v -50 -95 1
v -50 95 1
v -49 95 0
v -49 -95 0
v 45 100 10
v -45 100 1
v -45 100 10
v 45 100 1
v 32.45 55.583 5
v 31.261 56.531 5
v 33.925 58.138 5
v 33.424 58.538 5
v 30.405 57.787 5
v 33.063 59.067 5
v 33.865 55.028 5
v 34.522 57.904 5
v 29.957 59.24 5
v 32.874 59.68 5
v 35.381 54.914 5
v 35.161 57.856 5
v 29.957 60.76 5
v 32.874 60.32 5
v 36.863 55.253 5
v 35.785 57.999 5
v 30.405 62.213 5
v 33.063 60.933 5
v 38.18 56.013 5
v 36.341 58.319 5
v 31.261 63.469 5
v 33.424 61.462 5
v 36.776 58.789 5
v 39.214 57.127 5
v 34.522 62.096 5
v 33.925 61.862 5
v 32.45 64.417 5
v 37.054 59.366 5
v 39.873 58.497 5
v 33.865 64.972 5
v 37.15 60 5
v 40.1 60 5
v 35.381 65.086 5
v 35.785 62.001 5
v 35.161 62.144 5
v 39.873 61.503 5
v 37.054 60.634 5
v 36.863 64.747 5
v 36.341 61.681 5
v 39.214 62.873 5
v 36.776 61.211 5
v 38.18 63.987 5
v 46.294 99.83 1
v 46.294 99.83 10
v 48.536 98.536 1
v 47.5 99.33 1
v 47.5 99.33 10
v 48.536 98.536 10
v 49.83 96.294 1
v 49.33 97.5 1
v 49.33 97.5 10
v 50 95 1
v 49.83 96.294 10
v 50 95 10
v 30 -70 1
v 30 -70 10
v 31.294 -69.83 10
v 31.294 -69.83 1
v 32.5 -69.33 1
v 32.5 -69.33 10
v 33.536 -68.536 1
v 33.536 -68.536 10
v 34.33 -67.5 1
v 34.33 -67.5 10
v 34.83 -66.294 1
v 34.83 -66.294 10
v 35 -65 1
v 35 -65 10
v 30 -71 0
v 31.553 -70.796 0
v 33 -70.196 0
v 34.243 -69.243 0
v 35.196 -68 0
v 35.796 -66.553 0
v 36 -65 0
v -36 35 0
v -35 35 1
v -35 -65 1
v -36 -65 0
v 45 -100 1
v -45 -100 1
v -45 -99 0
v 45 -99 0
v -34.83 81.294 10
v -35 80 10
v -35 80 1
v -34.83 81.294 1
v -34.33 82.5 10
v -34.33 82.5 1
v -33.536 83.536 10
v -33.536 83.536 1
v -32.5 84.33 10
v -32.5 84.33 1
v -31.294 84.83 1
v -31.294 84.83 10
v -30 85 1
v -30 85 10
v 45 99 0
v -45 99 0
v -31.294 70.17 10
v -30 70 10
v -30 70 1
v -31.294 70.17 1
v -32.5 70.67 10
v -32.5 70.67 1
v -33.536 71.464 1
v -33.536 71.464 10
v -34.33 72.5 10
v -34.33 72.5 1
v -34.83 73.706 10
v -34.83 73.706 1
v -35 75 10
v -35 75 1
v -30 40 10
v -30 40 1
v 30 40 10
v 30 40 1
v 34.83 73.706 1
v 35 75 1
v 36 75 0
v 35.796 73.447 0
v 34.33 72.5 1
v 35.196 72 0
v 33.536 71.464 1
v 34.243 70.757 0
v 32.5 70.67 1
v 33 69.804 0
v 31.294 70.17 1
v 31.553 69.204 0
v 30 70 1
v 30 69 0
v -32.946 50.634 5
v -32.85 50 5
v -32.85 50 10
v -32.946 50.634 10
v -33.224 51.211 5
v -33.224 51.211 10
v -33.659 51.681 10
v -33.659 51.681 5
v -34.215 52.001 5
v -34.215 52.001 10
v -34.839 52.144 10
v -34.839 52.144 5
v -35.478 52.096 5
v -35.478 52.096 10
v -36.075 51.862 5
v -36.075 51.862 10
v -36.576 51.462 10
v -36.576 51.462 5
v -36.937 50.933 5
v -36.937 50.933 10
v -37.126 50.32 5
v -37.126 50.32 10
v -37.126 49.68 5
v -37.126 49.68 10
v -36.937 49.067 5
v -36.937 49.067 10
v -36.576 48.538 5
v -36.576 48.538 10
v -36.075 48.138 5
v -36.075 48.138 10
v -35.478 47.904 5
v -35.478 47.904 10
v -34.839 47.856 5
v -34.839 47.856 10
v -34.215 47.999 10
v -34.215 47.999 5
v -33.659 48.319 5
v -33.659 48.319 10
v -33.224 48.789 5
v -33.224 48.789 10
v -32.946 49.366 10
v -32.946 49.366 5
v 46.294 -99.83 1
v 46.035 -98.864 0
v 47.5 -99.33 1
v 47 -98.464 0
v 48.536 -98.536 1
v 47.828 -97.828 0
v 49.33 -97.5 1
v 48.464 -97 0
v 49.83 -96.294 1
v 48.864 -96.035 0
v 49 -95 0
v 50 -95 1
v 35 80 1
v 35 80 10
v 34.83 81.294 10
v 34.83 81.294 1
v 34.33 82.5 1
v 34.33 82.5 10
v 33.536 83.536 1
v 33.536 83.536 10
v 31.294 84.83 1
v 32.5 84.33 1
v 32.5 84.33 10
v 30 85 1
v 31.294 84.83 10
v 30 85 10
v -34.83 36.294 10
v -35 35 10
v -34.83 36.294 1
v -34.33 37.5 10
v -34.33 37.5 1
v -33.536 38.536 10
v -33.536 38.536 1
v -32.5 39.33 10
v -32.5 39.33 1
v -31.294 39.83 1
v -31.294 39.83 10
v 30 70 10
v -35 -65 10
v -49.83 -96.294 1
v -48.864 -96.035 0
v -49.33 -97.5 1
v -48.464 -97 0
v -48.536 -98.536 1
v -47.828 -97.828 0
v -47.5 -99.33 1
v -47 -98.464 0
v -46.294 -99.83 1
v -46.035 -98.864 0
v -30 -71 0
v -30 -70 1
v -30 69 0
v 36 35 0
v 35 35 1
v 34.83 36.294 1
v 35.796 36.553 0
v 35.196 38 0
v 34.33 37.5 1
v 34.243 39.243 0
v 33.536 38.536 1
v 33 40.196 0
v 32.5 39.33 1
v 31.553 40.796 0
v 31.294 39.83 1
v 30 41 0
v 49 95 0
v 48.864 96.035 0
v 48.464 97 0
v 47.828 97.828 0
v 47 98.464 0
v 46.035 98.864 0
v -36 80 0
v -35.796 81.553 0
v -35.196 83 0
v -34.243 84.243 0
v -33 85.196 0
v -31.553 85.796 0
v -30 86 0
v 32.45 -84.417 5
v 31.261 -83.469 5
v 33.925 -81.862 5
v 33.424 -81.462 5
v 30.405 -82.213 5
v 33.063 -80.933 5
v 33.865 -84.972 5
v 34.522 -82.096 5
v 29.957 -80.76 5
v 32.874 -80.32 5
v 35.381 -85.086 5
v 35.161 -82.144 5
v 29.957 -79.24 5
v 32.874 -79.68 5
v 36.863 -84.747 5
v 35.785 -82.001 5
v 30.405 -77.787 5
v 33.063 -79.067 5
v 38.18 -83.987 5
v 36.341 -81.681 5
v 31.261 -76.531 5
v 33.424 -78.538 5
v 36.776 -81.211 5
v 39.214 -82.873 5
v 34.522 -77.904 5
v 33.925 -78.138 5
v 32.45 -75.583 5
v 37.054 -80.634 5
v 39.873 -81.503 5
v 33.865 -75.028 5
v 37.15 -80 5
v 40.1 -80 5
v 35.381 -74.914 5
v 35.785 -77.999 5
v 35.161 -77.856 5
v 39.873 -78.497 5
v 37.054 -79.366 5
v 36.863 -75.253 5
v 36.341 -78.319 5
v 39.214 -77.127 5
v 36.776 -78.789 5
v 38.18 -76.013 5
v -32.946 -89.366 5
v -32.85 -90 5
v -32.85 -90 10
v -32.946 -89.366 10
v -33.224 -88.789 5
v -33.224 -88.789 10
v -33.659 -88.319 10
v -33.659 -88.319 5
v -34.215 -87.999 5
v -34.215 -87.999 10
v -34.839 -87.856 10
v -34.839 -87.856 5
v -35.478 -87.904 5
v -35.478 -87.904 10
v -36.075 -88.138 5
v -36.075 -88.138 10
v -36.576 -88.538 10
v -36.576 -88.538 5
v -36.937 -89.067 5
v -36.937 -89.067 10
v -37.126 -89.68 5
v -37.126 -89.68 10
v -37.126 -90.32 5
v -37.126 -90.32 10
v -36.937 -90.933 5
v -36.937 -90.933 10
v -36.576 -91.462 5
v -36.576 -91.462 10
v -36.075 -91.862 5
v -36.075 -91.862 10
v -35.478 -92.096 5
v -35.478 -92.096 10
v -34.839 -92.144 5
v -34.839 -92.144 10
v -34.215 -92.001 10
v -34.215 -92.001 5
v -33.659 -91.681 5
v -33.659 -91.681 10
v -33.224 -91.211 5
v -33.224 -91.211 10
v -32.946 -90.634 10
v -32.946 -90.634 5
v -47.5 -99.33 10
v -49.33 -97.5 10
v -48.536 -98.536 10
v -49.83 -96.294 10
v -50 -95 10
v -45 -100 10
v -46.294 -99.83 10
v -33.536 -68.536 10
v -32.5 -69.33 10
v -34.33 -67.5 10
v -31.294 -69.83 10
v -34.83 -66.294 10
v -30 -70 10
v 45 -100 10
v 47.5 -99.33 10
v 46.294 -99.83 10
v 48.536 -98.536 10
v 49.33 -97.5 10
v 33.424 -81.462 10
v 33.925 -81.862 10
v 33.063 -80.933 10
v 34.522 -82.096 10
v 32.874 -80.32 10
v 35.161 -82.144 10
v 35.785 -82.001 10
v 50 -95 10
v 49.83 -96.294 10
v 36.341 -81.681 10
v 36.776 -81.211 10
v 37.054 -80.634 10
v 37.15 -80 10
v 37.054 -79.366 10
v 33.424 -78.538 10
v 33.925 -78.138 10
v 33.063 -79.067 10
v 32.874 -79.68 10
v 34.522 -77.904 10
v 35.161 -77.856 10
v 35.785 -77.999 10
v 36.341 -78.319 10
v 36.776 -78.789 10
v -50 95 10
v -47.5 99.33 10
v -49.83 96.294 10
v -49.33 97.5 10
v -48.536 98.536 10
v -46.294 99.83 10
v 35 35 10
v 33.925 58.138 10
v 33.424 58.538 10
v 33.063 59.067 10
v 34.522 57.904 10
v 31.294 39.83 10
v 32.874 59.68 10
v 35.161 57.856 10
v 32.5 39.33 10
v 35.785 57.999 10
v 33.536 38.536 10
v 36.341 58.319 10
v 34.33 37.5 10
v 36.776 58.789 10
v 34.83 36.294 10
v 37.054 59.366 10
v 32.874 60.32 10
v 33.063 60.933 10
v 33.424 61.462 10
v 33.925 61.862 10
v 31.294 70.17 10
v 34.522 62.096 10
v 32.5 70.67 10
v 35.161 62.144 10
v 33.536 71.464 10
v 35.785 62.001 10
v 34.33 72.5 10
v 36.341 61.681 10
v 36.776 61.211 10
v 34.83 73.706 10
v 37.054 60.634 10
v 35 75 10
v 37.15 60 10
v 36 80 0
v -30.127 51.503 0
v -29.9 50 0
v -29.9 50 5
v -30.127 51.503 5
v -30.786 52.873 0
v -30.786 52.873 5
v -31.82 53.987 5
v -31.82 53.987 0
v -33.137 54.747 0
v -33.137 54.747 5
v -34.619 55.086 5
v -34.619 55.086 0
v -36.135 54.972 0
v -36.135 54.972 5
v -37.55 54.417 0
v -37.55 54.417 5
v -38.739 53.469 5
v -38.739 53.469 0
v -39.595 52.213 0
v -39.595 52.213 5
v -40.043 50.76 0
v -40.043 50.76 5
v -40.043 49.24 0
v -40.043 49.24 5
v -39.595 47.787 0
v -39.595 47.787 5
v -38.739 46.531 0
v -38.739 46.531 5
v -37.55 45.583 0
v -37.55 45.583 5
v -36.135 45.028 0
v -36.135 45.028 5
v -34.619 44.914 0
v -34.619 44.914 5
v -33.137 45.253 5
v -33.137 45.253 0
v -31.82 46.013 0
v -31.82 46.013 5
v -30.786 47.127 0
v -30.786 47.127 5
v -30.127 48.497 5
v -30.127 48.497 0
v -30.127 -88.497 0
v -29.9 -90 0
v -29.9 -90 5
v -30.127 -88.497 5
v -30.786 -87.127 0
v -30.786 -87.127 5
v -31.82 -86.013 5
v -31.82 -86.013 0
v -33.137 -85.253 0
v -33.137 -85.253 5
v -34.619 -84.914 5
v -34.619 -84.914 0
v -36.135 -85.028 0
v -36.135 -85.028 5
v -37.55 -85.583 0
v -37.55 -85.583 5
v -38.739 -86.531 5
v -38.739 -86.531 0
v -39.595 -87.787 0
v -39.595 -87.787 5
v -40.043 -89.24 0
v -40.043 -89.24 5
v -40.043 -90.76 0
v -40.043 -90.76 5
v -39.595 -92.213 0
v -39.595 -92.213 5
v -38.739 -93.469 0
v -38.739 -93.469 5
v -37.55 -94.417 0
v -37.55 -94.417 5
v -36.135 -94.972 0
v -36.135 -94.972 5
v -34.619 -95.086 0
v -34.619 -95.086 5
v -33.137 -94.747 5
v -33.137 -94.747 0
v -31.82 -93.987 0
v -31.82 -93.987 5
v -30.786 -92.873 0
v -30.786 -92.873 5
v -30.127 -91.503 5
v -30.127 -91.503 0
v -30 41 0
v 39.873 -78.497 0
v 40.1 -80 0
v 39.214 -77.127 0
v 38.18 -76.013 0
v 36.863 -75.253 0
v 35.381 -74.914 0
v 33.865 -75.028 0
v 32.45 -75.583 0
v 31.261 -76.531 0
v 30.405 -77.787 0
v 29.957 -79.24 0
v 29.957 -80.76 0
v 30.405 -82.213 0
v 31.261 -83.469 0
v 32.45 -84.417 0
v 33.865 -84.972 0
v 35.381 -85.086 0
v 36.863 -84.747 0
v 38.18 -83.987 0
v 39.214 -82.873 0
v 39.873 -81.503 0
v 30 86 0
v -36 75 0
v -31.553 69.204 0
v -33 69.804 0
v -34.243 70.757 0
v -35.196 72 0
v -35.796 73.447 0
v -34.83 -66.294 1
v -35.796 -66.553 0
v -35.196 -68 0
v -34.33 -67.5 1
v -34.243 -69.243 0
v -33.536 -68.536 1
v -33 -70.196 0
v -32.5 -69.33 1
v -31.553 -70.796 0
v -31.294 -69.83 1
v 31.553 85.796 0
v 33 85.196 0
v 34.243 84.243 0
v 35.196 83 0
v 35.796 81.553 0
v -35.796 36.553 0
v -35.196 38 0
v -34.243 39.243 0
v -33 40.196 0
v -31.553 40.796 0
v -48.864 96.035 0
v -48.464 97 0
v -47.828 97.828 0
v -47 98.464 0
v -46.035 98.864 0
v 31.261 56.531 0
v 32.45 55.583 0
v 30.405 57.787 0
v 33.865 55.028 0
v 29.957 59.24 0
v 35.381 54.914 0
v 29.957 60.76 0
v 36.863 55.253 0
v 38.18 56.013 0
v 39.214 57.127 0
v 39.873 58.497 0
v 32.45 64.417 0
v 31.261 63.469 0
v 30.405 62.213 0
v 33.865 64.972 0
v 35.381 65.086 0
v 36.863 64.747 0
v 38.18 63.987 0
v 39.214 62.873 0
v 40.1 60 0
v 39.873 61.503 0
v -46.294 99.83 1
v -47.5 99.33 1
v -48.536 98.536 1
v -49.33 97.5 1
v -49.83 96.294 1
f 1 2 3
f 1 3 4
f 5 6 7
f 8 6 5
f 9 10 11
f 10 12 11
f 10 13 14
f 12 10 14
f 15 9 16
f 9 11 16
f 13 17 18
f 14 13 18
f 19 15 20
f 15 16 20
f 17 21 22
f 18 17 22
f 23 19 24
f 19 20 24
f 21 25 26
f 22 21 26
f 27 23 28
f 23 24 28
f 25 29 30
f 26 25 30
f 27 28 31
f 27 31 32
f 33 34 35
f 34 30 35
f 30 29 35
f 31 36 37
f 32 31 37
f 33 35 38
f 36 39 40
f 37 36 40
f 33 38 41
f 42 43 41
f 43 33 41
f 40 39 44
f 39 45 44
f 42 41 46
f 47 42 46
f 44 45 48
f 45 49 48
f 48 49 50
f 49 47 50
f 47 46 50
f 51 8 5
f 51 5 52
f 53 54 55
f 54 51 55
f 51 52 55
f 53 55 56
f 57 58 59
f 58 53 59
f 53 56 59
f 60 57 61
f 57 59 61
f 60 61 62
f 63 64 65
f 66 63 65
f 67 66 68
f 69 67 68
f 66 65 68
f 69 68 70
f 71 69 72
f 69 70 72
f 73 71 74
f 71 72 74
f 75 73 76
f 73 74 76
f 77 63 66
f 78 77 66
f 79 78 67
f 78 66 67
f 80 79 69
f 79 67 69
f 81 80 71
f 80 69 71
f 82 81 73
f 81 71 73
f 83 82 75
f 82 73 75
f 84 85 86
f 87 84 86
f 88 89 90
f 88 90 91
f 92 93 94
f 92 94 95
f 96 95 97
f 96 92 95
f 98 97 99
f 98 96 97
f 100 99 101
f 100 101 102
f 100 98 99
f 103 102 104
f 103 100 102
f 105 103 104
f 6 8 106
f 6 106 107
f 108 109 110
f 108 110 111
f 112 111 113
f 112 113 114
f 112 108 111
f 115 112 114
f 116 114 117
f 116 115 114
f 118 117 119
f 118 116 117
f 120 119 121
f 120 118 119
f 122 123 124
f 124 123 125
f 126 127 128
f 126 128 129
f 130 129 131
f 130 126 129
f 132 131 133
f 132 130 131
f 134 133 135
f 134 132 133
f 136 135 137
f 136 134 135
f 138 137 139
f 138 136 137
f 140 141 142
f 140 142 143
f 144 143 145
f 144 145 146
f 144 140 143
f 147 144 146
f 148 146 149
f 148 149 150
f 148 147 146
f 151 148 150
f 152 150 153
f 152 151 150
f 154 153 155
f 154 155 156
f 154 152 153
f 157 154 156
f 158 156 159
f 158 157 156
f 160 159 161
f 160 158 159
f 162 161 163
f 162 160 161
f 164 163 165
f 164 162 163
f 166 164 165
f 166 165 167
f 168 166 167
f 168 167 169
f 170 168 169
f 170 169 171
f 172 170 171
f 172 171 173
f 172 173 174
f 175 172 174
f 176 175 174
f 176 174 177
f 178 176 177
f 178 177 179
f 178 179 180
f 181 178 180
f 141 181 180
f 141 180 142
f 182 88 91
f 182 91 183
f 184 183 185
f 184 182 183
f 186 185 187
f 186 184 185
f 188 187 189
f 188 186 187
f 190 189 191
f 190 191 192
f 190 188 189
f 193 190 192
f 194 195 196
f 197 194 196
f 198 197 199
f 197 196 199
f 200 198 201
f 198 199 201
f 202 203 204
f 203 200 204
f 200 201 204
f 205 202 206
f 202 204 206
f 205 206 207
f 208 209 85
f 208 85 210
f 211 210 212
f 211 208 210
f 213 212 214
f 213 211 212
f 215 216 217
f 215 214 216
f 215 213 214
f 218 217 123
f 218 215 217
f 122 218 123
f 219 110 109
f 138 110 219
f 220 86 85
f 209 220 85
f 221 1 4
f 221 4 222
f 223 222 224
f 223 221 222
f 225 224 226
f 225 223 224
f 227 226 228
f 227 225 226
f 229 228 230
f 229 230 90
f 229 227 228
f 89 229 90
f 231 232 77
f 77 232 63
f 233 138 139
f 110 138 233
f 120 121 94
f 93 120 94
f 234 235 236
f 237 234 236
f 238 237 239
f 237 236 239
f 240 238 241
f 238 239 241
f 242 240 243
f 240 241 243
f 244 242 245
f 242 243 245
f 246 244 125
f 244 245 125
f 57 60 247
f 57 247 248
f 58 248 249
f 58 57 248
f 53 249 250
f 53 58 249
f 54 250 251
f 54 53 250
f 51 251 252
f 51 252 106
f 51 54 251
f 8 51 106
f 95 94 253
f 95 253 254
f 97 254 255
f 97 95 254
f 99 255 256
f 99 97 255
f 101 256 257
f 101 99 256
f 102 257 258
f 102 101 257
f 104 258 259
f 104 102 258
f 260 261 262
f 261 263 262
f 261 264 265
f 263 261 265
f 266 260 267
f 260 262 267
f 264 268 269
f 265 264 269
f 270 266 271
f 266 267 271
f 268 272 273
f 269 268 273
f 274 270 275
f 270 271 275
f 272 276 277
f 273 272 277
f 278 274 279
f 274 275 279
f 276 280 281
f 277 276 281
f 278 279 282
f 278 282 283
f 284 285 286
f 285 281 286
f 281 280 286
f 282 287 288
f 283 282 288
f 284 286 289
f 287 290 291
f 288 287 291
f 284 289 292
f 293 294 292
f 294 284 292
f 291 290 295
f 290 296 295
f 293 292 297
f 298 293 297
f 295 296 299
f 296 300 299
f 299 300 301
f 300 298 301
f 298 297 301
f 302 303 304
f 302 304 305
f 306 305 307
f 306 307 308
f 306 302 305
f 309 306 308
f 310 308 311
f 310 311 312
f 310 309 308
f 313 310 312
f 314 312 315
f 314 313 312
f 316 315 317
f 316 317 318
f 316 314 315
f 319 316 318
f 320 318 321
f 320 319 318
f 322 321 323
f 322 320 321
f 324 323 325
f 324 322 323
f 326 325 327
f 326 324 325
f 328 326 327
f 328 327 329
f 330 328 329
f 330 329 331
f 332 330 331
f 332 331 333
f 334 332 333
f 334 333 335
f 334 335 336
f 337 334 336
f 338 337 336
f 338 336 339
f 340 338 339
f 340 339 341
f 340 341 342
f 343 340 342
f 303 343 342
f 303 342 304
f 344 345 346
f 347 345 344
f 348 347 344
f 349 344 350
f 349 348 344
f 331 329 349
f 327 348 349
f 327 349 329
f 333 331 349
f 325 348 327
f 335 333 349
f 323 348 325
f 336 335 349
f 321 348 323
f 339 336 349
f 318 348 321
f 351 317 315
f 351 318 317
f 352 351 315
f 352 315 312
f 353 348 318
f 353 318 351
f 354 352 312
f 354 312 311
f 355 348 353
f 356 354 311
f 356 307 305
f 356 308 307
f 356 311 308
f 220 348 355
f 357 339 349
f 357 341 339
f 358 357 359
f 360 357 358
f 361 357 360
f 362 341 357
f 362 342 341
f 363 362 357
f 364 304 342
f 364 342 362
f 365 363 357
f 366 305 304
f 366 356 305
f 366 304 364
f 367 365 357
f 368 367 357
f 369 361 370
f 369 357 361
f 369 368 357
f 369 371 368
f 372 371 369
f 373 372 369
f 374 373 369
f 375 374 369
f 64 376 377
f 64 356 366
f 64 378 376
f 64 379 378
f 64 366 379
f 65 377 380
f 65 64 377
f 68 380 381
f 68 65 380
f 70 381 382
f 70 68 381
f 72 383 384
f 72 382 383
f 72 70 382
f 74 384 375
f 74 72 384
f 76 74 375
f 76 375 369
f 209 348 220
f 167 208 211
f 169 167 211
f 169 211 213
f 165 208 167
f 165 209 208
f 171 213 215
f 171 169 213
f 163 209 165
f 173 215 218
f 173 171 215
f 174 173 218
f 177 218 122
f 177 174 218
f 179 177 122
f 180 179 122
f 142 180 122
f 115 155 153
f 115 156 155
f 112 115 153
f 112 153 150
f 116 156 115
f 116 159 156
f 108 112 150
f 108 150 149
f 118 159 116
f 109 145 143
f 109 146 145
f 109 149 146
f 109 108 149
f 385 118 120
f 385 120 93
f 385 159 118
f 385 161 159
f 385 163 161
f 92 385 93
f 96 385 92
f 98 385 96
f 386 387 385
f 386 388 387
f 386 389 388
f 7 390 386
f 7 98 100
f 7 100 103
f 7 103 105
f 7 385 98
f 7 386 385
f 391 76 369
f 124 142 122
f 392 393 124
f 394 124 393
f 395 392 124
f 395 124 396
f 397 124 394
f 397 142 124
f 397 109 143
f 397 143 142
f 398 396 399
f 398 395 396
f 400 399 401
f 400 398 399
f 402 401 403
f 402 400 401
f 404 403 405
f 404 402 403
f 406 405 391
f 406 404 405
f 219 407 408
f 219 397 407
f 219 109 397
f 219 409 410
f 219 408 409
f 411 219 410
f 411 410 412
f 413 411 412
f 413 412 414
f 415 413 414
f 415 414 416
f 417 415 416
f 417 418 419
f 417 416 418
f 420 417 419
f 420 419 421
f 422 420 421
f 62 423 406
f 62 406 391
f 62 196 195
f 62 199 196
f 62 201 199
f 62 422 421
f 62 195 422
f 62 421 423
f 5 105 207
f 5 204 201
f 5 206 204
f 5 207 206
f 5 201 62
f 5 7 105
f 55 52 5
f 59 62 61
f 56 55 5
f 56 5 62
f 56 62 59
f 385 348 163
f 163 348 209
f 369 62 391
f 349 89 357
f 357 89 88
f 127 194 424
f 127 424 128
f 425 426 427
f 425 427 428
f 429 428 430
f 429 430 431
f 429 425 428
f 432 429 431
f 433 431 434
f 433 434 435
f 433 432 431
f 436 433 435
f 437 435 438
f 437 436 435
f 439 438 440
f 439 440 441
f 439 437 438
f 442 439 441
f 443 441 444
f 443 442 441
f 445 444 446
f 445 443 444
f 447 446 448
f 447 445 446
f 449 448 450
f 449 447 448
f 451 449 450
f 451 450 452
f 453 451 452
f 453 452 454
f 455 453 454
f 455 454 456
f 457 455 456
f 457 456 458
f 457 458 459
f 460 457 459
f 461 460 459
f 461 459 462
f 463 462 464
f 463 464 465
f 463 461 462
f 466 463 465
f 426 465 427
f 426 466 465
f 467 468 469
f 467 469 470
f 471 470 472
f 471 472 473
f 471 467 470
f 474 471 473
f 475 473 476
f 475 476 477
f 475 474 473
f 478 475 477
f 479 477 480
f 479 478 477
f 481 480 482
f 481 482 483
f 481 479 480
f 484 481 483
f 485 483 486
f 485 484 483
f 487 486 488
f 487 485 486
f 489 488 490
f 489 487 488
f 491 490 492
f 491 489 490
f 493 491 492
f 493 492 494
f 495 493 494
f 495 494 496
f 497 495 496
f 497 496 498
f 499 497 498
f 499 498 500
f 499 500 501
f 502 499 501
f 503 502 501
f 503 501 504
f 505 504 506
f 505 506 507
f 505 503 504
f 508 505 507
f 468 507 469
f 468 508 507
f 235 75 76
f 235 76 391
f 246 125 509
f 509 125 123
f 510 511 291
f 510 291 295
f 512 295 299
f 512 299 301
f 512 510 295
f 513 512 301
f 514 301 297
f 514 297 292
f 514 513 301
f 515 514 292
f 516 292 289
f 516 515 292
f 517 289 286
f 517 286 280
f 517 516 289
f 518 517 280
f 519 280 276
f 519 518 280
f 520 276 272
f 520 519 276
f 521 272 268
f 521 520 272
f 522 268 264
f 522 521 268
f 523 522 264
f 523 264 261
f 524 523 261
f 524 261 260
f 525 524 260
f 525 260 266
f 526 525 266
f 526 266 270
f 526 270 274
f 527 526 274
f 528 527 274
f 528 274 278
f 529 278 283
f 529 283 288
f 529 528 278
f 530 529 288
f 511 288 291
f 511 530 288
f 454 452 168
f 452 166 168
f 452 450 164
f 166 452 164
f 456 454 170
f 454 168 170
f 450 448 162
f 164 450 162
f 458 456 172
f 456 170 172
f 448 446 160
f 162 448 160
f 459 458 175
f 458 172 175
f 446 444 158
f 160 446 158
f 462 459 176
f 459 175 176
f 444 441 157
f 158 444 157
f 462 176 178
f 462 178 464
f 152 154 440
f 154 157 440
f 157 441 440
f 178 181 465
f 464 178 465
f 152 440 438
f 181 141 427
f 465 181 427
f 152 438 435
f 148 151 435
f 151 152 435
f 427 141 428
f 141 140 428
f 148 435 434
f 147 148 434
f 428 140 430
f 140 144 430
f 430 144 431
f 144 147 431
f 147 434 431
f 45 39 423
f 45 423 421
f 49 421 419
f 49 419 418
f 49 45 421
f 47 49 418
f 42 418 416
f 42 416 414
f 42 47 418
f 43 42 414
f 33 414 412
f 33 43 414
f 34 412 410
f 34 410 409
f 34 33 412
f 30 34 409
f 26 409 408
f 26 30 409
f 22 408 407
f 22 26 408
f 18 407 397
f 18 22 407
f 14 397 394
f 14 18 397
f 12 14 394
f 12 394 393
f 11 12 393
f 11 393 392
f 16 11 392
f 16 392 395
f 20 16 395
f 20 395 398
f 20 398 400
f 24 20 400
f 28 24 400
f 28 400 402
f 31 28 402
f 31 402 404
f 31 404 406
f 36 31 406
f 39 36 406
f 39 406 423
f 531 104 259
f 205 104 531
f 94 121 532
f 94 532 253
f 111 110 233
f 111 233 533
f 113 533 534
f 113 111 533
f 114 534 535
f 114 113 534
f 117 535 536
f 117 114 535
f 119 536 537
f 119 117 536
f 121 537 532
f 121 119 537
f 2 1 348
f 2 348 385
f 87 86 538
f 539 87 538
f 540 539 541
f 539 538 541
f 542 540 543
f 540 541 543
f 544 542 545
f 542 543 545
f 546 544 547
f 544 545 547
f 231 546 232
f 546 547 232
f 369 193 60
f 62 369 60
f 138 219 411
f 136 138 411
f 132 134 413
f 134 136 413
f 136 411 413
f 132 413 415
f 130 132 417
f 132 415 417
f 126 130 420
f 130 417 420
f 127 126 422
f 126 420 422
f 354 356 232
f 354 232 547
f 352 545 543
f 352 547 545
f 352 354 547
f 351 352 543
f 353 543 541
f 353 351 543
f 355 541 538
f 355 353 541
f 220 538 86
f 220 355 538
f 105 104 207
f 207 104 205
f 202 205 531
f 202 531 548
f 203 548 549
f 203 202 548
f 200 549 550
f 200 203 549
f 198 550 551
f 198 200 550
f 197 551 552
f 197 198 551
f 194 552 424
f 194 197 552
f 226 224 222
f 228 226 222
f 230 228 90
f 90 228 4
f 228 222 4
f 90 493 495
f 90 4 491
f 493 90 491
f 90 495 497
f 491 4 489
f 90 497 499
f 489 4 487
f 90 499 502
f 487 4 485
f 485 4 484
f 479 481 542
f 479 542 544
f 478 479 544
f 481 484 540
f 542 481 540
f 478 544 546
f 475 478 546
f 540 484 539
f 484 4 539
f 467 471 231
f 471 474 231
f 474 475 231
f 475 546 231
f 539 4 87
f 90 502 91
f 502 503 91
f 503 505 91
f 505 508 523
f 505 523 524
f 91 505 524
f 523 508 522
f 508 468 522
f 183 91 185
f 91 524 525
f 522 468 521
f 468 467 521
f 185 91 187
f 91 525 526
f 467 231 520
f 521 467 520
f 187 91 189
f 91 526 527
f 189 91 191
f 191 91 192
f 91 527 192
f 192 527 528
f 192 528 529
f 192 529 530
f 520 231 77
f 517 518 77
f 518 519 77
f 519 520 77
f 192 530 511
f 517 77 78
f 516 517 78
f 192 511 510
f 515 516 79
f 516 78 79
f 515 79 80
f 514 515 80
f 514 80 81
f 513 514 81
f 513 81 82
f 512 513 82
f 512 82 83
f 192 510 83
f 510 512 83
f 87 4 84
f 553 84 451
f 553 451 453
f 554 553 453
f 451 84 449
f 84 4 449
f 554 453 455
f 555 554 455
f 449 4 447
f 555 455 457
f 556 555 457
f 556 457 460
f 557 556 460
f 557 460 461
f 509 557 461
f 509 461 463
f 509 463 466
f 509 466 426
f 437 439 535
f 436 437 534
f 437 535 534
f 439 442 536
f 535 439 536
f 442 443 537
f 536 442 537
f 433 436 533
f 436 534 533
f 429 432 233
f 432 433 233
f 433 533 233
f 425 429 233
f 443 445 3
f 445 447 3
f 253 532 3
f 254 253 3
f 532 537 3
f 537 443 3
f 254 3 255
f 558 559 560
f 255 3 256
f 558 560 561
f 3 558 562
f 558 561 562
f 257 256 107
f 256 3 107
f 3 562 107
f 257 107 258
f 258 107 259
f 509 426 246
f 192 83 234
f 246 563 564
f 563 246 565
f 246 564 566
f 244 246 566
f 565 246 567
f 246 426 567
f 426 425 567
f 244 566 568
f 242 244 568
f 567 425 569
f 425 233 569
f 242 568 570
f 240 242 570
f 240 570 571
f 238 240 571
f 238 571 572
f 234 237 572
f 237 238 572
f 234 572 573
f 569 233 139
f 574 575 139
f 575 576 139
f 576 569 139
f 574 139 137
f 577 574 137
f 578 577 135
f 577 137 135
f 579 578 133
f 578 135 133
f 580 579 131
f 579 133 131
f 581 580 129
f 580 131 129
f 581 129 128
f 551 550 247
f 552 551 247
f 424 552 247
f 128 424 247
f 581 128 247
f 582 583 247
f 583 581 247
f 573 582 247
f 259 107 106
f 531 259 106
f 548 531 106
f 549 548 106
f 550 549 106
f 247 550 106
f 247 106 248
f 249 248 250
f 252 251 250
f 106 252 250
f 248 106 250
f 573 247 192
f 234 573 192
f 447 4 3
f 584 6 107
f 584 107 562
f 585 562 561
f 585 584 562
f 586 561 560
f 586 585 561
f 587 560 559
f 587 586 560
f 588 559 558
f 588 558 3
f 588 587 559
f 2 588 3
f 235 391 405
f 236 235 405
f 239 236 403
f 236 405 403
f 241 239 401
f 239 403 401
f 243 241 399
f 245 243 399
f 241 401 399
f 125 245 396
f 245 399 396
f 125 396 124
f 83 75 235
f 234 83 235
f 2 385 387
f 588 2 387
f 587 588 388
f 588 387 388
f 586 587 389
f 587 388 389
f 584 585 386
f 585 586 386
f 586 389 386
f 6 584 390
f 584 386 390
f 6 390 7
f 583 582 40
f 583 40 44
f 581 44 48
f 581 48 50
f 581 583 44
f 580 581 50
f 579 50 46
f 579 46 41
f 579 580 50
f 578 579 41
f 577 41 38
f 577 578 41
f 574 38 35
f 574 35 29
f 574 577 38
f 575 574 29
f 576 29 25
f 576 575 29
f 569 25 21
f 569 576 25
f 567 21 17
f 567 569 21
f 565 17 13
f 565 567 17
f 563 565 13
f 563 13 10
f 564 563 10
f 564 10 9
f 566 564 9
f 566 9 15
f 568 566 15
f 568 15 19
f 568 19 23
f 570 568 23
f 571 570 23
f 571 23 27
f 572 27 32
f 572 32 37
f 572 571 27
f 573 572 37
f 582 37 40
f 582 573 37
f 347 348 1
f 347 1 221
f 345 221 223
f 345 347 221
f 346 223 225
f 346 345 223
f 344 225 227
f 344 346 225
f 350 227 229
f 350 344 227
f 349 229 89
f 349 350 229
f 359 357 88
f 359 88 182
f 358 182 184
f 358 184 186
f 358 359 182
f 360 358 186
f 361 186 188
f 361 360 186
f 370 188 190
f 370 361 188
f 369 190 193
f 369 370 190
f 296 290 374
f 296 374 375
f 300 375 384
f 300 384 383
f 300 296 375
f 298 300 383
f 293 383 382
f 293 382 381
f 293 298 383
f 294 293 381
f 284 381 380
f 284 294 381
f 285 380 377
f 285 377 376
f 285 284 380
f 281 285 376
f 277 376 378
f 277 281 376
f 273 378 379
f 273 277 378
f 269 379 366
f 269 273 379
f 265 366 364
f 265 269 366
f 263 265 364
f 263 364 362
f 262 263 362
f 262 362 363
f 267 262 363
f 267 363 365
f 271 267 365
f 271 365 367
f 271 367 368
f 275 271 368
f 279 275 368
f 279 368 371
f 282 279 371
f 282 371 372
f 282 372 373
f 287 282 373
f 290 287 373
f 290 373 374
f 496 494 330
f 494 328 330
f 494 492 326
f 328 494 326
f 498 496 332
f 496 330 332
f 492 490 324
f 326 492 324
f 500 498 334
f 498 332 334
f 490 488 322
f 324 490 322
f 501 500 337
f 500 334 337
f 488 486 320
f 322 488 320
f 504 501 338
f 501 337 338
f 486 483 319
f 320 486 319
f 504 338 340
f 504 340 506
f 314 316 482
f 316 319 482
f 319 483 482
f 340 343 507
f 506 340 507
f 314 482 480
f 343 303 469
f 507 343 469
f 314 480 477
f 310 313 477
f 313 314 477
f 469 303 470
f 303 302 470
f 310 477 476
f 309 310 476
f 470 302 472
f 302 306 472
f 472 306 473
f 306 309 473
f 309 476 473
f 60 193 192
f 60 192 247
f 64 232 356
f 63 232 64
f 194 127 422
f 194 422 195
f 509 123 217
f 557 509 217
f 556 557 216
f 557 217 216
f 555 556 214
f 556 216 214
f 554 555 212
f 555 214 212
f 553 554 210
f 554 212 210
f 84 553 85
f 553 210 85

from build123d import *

# Parameters (mm, degrees)
F0_W     = 100
F0_H     = 200
F0_R     = 5.1
F0_W_2   = 70
F0_H_2   = 110
F0_H_3   = 15
F0_R_2   = 2.15
F1_DEPTH = 10
F2_R     = 5
F3_SIZE  = 1
F4_DEPTH = 5


with BuildPart() as f1:
    # F0 (on Top) → F1 (new body)
    with BuildSketch(Plane.XY):
        Rectangle(F0_W, F0_H)
        with Locations((-35, -90)):
            Circle(F0_R, mode=Mode.SUBTRACT)
        with Locations((35, -80)):
            Circle(F0_R, mode=Mode.SUBTRACT)
        with Locations((0, -15)):
            Rectangle(F0_W_2, F0_H_2, mode=Mode.SUBTRACT)
        with Locations((-35, 50)):
            Circle(F0_R, mode=Mode.SUBTRACT)
        with Locations((0, 77.5)):
            Rectangle(F0_W_2, F0_H_3, mode=Mode.SUBTRACT)
        with Locations((35, 60)):
            Circle(F0_R, mode=Mode.SUBTRACT)
        with Locations((35, -80)):
            Circle(F0_R)
        with Locations((35, -80)):
            Circle(F0_R_2, mode=Mode.SUBTRACT)
        with Locations((-35, -90)):
            Circle(F0_R)
        with Locations((-35, -90)):
            Circle(F0_R_2, mode=Mode.SUBTRACT)
        with Locations((-35, 50)):
            Circle(F0_R)
        with Locations((-35, 50)):
            Circle(F0_R_2, mode=Mode.SUBTRACT)
        with Locations((35, 60)):
            Circle(F0_R)
        with Locations((35, 60)):
            Circle(F0_R_2, mode=Mode.SUBTRACT)
    extrude(amount=F1_DEPTH)

    # F2
    f2_edges = [f1.edges().sort_by_distance(p)[0] for p in [
        (-50, -100, 5),
        (50, -100, 5),
        (35, -70, 5),
        (-35, -70, 5),
        (35, 40, 5),
        (-35, 40, 5),
        (-50, 100, 5),
        (50, 100, 5),
        (35, 70, 5),
        (35, 85, 5),
        (-35, 70, 5),
        (-35, 85, 5),
    ]]
    fillet(f2_edges, radius=F2_R)

    # F3
    f3_edges = [f1.edges().sort_by_distance(p)[0] for p in [
        (50, 0, 0),
        (48.535534, -98.535534, 0),
        (48.535534, 98.535534, 0),
        (0, -100, 0),
        (0, 100, 0),
        (-48.535534, -98.535534, 0),
        (-48.535534, 98.535534, 0),
        (-50, 0, 0),
        (32.85, -80, 0),
        (-37.15, -90, 0),
        (-37.15, 50, 0),
        (32.85, 60, 0),
        (0, -70, 0),
        (33.535534, -68.535534, 0),
        (-33.535534, -68.535534, 0),
        (35, -15, 0),
        (-35, -15, 0),
        (33.535534, 38.535534, 0),
        (-33.535534, 38.535534, 0),
        (0, 40, 0),
        (-35, 77.5, 0),
        (-33.535534, 71.464466, 0),
        (-33.535534, 83.535534, 0),
        (0, 70, 0),
        (0, 85, 0),
        (33.535534, 71.464466, 0),
        (33.535534, 83.535534, 0),
        (35, 77.5, 0),
    ]]
    chamfer(f3_edges, length=F3_SIZE)

    # F0 (on Top) → F4 (cut)
    with BuildSketch(Plane.XY):
        with Locations((-35, 50)):
            Circle(F0_R)
        with Locations((-35, 50)):
            Circle(F0_R_2, mode=Mode.SUBTRACT)
        with Locations((35, 60)):
            Circle(F0_R)
        with Locations((35, 60)):
            Circle(F0_R_2, mode=Mode.SUBTRACT)
        with Locations((35, -80)):
            Circle(F0_R)
        with Locations((35, -80)):
            Circle(F0_R_2, mode=Mode.SUBTRACT)
        with Locations((-35, -90)):
            Circle(F0_R)
        with Locations((-35, -90)):
            Circle(F0_R_2, mode=Mode.SUBTRACT)
    extrude(amount=F4_DEPTH, mode=Mode.SUBTRACT)


solid = f1.part
